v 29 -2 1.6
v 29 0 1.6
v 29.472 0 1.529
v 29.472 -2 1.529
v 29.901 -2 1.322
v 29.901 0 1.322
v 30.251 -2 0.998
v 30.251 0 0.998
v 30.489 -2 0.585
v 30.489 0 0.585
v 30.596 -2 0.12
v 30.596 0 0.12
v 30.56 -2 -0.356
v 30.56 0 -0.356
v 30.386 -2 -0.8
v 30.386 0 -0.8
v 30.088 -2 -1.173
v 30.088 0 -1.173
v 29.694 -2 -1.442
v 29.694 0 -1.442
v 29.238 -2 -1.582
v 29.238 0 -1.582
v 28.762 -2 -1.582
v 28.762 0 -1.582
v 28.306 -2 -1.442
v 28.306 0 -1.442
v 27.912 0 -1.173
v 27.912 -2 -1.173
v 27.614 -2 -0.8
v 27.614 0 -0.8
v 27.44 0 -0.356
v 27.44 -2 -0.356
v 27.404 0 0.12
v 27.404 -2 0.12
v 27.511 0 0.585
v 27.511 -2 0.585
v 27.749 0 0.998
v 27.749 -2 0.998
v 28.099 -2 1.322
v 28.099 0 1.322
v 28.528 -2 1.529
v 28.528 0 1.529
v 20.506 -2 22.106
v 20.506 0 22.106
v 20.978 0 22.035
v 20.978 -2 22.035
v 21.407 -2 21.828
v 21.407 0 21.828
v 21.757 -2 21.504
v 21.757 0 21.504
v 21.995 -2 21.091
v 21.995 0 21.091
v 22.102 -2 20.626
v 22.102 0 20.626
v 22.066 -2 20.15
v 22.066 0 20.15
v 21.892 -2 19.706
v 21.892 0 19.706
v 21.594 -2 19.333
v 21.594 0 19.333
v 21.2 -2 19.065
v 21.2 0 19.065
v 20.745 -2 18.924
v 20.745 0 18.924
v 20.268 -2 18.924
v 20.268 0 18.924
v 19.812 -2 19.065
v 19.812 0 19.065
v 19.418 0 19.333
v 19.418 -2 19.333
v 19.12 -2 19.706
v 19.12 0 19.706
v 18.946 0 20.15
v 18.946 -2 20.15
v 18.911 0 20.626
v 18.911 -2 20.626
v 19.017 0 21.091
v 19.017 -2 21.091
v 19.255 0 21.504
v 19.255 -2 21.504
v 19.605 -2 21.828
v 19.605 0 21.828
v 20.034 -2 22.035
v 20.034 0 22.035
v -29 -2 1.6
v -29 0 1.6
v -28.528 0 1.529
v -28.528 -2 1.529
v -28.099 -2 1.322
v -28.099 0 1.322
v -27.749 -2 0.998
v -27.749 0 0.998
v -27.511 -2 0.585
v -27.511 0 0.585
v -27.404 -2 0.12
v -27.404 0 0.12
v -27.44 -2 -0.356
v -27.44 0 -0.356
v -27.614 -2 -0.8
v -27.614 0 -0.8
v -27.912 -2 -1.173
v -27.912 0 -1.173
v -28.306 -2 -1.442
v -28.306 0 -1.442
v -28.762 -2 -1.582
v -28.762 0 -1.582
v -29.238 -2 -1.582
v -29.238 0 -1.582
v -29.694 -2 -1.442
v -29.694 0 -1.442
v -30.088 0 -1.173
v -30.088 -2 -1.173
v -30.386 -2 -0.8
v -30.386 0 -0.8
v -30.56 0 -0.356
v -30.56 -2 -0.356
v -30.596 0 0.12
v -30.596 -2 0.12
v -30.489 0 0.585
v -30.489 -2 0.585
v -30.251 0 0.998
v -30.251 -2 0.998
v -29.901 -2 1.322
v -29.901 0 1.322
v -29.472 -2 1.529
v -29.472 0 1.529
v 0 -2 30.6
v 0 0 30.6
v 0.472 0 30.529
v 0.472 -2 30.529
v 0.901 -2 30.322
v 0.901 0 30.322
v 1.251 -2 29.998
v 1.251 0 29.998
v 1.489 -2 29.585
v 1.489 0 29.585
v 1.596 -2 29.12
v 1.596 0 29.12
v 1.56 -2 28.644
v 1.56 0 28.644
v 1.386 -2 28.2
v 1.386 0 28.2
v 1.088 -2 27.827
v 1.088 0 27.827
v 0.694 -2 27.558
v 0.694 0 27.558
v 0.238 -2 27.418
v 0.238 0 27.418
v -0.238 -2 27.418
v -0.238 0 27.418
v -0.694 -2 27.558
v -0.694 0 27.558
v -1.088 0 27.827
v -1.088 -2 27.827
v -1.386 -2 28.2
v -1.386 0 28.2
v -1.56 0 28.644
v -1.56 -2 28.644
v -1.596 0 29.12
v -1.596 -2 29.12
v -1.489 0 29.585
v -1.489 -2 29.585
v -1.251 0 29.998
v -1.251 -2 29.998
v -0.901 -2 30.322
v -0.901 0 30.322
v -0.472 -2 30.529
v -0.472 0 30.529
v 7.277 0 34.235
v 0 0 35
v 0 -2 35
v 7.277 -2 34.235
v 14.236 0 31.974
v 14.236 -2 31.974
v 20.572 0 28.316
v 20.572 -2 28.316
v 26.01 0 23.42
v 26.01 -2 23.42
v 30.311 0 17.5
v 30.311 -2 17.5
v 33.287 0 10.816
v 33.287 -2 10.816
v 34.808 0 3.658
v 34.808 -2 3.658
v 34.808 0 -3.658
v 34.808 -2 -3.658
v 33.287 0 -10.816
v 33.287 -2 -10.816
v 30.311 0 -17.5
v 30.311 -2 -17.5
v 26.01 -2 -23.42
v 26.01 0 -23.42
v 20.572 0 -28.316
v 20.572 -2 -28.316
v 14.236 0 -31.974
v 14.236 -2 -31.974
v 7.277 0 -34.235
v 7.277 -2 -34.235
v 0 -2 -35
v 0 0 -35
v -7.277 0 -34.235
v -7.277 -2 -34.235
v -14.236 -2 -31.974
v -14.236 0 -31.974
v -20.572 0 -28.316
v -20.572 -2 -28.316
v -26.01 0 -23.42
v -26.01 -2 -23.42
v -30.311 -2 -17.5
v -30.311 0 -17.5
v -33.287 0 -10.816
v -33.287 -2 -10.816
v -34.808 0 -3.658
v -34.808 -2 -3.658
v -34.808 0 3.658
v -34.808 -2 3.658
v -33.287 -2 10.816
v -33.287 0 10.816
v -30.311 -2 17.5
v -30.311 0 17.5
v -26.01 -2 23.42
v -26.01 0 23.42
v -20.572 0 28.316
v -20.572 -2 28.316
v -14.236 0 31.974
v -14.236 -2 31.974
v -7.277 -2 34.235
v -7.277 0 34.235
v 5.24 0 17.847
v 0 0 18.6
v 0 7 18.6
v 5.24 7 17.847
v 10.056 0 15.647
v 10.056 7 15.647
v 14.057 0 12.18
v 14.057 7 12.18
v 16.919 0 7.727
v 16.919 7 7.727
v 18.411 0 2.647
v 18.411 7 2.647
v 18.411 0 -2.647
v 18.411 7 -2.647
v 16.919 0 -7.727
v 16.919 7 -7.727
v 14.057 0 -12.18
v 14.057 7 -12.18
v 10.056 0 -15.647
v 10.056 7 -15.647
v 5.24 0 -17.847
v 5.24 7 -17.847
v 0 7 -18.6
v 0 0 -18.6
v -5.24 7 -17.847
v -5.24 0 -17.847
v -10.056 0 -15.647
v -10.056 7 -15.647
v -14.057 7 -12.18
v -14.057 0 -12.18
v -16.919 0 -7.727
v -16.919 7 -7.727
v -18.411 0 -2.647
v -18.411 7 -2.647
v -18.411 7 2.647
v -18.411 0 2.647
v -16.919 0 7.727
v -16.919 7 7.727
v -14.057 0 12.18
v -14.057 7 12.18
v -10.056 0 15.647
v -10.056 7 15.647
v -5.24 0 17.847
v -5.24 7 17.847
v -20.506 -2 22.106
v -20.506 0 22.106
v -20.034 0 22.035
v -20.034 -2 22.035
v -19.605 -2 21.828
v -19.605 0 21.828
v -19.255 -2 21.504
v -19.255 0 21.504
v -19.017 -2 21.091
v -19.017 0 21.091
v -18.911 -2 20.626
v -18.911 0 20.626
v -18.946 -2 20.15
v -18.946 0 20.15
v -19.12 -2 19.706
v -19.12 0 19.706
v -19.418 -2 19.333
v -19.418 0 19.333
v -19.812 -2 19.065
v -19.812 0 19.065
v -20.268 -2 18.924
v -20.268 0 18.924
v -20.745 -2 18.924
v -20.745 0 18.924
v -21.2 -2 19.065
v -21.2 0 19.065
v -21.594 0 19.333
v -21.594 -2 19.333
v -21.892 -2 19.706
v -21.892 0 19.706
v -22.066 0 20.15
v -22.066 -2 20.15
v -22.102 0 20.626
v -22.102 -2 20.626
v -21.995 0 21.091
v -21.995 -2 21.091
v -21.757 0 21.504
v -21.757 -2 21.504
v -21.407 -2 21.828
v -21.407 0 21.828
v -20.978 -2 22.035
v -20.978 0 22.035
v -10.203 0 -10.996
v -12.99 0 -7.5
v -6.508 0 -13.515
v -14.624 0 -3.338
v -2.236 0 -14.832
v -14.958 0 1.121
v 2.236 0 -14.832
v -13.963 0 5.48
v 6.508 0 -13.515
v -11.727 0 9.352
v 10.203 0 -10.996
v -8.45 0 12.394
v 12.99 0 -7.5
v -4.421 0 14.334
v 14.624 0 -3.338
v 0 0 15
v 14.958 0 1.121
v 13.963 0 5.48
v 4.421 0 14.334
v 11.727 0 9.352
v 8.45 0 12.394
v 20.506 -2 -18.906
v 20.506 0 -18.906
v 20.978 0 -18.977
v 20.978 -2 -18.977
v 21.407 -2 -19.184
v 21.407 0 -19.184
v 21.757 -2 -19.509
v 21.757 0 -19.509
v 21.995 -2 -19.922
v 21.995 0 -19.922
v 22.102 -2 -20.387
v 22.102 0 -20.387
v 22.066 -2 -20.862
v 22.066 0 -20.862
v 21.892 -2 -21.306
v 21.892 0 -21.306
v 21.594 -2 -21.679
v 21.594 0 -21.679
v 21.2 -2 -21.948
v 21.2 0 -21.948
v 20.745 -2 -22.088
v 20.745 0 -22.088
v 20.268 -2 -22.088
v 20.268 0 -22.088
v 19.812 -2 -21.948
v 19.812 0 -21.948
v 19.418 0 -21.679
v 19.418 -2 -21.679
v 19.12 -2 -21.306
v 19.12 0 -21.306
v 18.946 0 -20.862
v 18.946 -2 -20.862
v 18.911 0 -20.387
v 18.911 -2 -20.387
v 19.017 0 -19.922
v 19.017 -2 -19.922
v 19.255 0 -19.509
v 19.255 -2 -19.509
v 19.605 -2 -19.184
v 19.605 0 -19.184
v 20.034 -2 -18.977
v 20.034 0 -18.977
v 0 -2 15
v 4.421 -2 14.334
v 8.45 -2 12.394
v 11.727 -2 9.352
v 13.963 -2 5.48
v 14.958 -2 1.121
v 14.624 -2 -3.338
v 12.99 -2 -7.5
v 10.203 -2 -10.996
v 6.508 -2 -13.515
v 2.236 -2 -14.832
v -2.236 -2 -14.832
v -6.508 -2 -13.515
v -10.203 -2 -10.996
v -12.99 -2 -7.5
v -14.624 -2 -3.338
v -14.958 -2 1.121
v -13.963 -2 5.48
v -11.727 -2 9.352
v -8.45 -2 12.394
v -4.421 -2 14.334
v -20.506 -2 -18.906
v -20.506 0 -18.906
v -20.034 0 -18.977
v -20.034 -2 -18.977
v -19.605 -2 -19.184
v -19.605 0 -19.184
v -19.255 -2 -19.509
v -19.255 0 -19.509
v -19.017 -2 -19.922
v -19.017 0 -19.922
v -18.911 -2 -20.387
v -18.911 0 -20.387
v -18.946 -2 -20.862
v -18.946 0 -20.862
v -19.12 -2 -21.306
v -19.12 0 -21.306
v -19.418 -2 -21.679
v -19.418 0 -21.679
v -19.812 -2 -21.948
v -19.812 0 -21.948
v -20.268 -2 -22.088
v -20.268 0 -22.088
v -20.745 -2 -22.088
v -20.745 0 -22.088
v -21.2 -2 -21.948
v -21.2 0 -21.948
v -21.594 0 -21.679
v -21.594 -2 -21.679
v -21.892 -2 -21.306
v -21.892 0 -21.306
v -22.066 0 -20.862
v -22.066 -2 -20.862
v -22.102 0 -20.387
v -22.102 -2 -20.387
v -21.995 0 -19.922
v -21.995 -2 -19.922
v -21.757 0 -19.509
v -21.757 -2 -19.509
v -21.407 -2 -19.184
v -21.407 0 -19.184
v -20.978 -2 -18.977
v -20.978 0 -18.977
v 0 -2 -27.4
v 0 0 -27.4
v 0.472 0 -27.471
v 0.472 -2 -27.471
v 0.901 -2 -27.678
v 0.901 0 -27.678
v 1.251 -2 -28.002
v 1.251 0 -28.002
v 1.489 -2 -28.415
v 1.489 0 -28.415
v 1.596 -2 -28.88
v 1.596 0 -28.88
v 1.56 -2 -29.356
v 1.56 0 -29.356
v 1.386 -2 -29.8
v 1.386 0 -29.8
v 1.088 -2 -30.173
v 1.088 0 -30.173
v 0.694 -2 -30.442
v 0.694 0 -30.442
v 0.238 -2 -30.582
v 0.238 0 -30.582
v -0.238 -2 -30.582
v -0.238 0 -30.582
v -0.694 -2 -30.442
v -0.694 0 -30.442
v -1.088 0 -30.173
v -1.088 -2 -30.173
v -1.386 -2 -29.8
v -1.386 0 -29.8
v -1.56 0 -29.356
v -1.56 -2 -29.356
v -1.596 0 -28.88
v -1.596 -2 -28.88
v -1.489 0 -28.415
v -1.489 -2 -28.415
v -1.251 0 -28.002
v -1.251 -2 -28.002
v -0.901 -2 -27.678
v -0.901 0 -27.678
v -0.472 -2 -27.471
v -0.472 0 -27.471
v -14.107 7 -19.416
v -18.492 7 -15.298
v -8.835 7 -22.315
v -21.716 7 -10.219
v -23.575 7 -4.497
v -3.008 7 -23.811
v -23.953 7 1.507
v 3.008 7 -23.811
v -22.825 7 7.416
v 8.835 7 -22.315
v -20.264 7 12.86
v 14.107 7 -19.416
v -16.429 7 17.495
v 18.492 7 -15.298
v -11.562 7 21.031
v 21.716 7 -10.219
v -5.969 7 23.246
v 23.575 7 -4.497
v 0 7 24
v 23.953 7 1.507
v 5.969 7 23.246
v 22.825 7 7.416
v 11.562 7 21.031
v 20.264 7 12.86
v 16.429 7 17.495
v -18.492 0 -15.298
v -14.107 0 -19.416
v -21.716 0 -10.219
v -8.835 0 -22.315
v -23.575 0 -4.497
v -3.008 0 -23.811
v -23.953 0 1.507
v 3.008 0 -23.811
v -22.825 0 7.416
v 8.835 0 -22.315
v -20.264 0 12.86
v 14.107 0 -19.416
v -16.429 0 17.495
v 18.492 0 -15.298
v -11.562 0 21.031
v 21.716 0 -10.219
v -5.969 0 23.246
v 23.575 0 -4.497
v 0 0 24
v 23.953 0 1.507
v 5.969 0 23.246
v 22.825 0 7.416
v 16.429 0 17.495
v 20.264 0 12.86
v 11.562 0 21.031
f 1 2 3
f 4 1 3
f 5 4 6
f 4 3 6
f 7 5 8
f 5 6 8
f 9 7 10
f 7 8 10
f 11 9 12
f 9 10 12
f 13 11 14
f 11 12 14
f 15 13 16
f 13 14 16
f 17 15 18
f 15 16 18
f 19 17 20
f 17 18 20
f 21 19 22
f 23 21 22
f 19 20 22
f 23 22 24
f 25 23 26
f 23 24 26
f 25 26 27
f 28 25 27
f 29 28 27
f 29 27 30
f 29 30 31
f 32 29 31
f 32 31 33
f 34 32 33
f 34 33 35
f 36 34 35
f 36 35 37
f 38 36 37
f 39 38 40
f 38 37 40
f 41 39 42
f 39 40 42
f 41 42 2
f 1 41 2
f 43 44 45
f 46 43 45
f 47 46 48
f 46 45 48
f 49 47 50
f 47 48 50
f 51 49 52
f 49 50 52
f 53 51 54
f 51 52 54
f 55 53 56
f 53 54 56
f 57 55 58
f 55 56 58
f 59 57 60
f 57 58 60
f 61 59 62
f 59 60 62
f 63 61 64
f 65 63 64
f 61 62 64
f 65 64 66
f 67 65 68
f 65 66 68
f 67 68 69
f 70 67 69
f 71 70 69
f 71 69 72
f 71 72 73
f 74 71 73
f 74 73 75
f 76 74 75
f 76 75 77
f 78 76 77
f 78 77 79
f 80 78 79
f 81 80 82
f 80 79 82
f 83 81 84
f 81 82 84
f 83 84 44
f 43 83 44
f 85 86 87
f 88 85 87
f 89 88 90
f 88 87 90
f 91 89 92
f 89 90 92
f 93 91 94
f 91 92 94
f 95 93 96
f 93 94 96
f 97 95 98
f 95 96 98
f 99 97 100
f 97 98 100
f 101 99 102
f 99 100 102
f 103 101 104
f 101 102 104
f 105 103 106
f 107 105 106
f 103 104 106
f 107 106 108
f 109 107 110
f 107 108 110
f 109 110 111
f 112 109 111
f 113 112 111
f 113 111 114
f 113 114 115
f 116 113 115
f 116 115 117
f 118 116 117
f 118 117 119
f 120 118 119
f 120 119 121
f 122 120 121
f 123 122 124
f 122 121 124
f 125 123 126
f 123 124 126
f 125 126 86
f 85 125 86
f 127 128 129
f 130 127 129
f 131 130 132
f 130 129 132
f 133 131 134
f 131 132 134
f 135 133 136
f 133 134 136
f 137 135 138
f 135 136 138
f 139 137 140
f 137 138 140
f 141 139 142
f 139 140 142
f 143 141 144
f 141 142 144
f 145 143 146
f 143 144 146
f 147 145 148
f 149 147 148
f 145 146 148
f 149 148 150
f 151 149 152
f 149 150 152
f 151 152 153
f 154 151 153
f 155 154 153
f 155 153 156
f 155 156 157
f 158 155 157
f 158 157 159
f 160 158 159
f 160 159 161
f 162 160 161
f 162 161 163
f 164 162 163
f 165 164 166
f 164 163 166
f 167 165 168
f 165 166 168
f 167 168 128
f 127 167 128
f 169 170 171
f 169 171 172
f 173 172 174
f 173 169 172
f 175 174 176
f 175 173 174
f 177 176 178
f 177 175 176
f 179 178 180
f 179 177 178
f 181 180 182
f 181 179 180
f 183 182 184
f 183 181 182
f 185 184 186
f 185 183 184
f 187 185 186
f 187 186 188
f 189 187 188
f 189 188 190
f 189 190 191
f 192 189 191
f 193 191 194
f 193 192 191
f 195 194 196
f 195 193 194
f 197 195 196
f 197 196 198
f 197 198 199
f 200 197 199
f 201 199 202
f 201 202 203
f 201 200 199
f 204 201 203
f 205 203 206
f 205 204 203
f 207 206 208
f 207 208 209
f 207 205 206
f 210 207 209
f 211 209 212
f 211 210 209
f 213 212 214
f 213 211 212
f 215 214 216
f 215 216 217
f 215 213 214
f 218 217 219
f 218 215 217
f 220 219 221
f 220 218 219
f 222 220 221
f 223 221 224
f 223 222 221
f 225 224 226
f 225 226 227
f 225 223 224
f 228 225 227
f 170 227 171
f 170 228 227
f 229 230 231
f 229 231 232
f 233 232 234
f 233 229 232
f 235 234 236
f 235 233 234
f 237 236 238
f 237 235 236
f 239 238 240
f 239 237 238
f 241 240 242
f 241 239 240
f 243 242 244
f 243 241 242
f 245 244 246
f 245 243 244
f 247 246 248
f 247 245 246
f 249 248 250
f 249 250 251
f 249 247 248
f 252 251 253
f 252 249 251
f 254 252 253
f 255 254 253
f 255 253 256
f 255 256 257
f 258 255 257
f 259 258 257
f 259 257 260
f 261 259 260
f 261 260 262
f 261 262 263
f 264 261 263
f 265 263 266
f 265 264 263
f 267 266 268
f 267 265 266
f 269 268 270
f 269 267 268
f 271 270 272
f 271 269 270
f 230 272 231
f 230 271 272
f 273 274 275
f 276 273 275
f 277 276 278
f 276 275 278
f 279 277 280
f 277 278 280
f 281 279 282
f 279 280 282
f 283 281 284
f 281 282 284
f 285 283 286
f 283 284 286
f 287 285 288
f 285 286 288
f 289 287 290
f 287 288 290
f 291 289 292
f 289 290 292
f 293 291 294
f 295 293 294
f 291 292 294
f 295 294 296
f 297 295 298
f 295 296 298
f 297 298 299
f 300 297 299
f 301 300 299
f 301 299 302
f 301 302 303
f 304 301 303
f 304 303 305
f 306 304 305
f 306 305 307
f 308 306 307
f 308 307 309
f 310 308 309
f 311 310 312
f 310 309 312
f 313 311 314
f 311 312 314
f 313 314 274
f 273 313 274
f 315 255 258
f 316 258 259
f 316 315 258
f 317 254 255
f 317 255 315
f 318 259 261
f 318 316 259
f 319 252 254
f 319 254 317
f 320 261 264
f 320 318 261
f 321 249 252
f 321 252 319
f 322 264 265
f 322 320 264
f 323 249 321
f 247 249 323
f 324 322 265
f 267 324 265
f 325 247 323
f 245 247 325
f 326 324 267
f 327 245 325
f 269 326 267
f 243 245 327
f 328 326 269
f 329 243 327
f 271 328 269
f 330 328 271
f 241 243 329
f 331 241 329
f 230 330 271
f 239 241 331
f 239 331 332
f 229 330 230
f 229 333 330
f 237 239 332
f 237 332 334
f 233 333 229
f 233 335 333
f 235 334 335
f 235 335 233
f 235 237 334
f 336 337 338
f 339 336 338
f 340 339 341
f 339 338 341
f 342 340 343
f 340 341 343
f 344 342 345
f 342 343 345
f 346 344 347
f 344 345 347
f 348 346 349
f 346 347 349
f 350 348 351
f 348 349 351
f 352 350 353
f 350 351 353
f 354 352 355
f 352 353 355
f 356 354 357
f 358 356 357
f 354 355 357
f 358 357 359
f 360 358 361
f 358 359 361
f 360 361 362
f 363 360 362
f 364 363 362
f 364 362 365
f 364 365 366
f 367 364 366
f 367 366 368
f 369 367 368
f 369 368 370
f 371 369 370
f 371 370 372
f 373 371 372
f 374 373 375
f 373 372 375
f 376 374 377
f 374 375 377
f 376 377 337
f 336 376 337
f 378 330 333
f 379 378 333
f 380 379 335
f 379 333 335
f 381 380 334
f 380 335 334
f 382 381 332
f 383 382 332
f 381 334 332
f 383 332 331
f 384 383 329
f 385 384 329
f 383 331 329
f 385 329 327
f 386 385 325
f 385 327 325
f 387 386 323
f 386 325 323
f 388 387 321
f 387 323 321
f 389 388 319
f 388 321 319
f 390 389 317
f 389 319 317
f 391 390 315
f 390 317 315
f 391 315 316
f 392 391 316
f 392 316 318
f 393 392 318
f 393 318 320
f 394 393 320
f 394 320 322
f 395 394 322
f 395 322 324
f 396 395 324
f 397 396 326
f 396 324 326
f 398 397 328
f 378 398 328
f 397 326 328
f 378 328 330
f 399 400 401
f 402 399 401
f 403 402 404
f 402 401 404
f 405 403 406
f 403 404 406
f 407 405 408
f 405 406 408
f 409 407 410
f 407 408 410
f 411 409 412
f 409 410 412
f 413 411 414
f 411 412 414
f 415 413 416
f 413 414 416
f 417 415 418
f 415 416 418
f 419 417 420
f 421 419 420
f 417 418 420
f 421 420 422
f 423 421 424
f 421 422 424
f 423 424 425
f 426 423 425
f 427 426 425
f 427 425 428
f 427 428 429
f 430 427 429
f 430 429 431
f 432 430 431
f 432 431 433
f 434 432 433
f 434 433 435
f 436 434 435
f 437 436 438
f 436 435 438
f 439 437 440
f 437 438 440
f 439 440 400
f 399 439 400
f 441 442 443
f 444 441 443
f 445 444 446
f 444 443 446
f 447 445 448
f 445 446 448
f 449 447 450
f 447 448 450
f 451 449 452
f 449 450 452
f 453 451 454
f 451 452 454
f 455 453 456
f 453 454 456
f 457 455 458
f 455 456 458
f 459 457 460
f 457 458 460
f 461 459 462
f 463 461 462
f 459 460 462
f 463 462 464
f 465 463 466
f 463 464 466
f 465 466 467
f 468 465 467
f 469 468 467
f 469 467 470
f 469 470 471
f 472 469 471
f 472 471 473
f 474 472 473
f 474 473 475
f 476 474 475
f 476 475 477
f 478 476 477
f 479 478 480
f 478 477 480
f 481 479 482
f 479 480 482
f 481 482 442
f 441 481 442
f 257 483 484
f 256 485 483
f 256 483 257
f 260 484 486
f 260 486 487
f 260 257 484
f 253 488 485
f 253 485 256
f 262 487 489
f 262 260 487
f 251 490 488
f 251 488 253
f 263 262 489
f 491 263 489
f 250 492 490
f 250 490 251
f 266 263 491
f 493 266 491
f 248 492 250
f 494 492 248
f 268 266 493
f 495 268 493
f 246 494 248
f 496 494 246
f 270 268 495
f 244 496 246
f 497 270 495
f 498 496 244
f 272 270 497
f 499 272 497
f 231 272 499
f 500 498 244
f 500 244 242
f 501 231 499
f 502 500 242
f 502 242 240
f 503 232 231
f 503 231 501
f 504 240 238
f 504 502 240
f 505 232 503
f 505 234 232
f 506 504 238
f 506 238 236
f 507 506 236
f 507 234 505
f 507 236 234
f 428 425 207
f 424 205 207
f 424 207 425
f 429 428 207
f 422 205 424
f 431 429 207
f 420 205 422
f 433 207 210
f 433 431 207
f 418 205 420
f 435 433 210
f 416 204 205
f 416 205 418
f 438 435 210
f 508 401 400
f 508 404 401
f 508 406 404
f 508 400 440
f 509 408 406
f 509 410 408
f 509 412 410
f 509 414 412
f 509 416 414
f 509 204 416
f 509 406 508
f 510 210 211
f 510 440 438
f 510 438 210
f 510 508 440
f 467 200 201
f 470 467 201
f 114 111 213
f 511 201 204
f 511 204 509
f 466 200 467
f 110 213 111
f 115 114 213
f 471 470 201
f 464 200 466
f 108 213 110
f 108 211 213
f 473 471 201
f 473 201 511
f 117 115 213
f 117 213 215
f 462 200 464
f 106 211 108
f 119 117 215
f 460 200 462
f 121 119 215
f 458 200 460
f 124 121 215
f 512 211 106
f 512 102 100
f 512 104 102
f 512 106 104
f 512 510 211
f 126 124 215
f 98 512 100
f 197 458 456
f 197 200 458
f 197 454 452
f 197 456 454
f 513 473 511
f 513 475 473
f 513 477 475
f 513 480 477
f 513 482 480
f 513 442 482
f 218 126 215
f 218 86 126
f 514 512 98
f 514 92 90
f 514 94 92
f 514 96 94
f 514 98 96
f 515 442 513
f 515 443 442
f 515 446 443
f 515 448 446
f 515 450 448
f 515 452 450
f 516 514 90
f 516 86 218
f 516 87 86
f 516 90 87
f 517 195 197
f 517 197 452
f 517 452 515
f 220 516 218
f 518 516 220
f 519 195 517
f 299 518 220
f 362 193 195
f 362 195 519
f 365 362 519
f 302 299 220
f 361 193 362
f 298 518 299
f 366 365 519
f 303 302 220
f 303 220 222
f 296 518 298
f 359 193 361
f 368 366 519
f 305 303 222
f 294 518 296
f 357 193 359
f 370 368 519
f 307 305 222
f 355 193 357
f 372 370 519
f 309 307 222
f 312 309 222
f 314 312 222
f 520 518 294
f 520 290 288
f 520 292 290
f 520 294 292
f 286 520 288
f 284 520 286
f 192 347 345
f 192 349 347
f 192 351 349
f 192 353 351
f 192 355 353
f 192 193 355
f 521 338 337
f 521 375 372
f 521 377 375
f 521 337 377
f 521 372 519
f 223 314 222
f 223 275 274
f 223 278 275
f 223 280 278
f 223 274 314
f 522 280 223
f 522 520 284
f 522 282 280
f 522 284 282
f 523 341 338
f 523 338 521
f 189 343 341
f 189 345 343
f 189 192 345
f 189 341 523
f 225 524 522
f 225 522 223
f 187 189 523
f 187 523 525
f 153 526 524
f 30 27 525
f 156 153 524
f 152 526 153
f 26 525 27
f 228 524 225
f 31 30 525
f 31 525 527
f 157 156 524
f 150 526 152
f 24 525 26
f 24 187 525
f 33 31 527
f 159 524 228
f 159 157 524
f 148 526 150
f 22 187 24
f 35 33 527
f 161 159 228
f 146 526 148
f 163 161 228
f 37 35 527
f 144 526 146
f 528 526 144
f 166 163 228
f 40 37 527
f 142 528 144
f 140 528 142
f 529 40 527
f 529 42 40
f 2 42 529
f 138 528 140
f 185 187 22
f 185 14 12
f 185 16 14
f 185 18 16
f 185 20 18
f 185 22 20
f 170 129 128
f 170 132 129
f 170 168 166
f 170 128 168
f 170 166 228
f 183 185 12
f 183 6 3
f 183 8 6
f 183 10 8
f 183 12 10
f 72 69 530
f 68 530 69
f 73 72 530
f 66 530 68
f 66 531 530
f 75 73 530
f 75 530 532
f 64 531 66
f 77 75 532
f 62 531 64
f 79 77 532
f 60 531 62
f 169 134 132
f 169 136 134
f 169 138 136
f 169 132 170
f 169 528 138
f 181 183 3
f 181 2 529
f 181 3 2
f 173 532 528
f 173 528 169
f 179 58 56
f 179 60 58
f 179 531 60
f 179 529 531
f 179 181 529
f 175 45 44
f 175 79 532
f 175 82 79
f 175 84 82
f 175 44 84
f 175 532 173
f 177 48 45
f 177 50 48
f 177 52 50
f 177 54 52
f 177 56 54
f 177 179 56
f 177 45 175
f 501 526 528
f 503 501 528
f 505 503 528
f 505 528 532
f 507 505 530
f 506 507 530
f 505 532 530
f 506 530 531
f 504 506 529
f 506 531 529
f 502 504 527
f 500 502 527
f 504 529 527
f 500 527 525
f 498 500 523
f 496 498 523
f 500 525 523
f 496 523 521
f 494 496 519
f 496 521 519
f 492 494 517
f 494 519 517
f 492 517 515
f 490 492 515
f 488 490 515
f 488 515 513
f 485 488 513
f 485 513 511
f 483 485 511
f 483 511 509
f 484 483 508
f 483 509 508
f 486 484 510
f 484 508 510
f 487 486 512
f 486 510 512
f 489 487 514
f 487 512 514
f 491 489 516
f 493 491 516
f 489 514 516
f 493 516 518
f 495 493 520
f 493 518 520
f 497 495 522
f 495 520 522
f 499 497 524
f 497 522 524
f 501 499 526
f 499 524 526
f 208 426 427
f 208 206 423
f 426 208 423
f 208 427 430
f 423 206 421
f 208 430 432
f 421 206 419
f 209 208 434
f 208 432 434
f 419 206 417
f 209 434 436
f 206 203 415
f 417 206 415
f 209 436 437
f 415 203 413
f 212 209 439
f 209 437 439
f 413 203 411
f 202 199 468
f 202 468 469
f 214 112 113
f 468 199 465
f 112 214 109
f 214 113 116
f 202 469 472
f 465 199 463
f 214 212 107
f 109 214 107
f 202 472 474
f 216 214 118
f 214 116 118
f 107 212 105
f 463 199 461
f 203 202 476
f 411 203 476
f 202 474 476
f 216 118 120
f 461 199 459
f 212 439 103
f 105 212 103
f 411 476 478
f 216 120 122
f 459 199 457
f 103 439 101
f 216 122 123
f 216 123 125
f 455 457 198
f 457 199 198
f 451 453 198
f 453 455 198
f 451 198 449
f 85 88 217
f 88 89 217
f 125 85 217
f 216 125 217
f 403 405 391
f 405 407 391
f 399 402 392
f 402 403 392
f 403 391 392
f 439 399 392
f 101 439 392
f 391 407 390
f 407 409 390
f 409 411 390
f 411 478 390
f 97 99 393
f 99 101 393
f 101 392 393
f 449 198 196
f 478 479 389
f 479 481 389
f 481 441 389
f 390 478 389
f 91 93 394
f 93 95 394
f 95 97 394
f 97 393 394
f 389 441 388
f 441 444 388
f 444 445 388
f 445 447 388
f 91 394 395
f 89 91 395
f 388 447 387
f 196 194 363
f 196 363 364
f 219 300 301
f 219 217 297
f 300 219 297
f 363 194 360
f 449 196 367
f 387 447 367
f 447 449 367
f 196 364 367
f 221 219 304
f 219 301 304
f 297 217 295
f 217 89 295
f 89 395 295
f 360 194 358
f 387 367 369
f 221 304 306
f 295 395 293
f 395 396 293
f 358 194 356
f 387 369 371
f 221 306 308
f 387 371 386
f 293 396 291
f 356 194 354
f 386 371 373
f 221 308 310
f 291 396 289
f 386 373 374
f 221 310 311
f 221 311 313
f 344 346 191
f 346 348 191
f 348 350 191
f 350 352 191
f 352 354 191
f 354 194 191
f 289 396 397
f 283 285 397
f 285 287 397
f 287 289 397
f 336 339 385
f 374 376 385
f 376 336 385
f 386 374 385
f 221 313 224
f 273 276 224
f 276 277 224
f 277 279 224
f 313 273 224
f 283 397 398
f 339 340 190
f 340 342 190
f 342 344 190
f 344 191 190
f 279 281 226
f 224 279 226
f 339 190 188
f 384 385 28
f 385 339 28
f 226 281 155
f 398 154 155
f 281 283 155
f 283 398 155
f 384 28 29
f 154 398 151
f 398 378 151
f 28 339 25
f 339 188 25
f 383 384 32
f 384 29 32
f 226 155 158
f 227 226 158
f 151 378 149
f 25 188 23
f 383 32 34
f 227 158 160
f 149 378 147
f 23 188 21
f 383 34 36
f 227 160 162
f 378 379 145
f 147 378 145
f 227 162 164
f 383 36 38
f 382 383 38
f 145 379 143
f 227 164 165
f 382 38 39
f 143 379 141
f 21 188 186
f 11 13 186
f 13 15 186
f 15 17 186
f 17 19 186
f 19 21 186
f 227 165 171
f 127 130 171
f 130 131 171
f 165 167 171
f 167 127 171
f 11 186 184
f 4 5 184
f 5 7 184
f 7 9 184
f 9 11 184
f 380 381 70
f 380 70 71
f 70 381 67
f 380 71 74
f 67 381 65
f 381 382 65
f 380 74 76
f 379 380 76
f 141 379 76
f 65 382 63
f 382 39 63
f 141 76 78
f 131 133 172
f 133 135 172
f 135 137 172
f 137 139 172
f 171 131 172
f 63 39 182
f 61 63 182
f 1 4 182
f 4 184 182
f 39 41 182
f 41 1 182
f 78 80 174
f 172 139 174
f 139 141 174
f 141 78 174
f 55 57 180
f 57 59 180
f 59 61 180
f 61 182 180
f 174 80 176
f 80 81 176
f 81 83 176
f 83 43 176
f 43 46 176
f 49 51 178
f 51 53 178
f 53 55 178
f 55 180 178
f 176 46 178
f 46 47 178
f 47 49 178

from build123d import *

# Parameters (mm, degrees)
SKETCH_1_R      = 35
SKETCH_1_R_2    = 15
SKETCH_1_R_3    = 1.6
EXTRUDE_1_DEPTH = 2
SKETCH_2_R      = 24
SKETCH_2_R_2    = 18.6
EXTRUDE_2_DEPTH = 7


with BuildPart() as part:
    # 草图1 → 凸台-拉伸1 (new body)
    with BuildSketch(Plane(origin=(0, 0, 0), x_dir=(1, 0, 0), z_dir=(0, 1, 0))):
        with Locations(Location((0, 0, 0), (0, 0, 270))):
            Circle(SKETCH_1_R)
        with Locations(Location((0, 0, 0), (0, 0, 270))):
            Circle(SKETCH_1_R_2, mode=Mode.SUBTRACT)
        with Locations(Location((29, 0, 0), (0, 0, 270))):
            Circle(SKETCH_1_R_3, mode=Mode.SUBTRACT)
        with Locations(Location((20.506096654, -20.506096654, 0), (0, 0, 270))):
            Circle(SKETCH_1_R_3, mode=Mode.SUBTRACT)
        with Locations(Location((0, -29, 0), (0, 0, 270))):
            Circle(SKETCH_1_R_3, mode=Mode.SUBTRACT)
        with Locations(Location((-20.506096654, -20.506096654, 0), (0, 0, 270))):
            Circle(SKETCH_1_R_3, mode=Mode.SUBTRACT)
        with Locations(Location((-29, 0, 0), (0, 0, 270))):
            Circle(SKETCH_1_R_3, mode=Mode.SUBTRACT)
        with Locations(Location((-20.506096654, 20.506096654, 0), (0, 0, 270))):
            Circle(SKETCH_1_R_3, mode=Mode.SUBTRACT)
        with Locations(Location((0, 29, 0), (0, 0, 270))):
            Circle(SKETCH_1_R_3, mode=Mode.SUBTRACT)
        with Locations(Location((20.506096654, 20.506096654, 0), (0, 0, 270))):
            Circle(SKETCH_1_R_3, mode=Mode.SUBTRACT)
    extrude(amount=-EXTRUDE_1_DEPTH)

    # 草图2 → 凸台-拉伸2 (add)
    with BuildSketch(Plane(origin=(0, 0, 0), x_dir=(1, 0, 0), z_dir=(0, 1, 0))):
        with Locations(Location((0, 0, 0), (0, 0, 270))):
            Circle(SKETCH_2_R)
        with Locations(Location((0, 0, 0), (0, 0, 270))):
            Circle(SKETCH_2_R_2, mode=Mode.SUBTRACT)
    extrude(amount=EXTRUDE_2_DEPTH)


solid = part.part
